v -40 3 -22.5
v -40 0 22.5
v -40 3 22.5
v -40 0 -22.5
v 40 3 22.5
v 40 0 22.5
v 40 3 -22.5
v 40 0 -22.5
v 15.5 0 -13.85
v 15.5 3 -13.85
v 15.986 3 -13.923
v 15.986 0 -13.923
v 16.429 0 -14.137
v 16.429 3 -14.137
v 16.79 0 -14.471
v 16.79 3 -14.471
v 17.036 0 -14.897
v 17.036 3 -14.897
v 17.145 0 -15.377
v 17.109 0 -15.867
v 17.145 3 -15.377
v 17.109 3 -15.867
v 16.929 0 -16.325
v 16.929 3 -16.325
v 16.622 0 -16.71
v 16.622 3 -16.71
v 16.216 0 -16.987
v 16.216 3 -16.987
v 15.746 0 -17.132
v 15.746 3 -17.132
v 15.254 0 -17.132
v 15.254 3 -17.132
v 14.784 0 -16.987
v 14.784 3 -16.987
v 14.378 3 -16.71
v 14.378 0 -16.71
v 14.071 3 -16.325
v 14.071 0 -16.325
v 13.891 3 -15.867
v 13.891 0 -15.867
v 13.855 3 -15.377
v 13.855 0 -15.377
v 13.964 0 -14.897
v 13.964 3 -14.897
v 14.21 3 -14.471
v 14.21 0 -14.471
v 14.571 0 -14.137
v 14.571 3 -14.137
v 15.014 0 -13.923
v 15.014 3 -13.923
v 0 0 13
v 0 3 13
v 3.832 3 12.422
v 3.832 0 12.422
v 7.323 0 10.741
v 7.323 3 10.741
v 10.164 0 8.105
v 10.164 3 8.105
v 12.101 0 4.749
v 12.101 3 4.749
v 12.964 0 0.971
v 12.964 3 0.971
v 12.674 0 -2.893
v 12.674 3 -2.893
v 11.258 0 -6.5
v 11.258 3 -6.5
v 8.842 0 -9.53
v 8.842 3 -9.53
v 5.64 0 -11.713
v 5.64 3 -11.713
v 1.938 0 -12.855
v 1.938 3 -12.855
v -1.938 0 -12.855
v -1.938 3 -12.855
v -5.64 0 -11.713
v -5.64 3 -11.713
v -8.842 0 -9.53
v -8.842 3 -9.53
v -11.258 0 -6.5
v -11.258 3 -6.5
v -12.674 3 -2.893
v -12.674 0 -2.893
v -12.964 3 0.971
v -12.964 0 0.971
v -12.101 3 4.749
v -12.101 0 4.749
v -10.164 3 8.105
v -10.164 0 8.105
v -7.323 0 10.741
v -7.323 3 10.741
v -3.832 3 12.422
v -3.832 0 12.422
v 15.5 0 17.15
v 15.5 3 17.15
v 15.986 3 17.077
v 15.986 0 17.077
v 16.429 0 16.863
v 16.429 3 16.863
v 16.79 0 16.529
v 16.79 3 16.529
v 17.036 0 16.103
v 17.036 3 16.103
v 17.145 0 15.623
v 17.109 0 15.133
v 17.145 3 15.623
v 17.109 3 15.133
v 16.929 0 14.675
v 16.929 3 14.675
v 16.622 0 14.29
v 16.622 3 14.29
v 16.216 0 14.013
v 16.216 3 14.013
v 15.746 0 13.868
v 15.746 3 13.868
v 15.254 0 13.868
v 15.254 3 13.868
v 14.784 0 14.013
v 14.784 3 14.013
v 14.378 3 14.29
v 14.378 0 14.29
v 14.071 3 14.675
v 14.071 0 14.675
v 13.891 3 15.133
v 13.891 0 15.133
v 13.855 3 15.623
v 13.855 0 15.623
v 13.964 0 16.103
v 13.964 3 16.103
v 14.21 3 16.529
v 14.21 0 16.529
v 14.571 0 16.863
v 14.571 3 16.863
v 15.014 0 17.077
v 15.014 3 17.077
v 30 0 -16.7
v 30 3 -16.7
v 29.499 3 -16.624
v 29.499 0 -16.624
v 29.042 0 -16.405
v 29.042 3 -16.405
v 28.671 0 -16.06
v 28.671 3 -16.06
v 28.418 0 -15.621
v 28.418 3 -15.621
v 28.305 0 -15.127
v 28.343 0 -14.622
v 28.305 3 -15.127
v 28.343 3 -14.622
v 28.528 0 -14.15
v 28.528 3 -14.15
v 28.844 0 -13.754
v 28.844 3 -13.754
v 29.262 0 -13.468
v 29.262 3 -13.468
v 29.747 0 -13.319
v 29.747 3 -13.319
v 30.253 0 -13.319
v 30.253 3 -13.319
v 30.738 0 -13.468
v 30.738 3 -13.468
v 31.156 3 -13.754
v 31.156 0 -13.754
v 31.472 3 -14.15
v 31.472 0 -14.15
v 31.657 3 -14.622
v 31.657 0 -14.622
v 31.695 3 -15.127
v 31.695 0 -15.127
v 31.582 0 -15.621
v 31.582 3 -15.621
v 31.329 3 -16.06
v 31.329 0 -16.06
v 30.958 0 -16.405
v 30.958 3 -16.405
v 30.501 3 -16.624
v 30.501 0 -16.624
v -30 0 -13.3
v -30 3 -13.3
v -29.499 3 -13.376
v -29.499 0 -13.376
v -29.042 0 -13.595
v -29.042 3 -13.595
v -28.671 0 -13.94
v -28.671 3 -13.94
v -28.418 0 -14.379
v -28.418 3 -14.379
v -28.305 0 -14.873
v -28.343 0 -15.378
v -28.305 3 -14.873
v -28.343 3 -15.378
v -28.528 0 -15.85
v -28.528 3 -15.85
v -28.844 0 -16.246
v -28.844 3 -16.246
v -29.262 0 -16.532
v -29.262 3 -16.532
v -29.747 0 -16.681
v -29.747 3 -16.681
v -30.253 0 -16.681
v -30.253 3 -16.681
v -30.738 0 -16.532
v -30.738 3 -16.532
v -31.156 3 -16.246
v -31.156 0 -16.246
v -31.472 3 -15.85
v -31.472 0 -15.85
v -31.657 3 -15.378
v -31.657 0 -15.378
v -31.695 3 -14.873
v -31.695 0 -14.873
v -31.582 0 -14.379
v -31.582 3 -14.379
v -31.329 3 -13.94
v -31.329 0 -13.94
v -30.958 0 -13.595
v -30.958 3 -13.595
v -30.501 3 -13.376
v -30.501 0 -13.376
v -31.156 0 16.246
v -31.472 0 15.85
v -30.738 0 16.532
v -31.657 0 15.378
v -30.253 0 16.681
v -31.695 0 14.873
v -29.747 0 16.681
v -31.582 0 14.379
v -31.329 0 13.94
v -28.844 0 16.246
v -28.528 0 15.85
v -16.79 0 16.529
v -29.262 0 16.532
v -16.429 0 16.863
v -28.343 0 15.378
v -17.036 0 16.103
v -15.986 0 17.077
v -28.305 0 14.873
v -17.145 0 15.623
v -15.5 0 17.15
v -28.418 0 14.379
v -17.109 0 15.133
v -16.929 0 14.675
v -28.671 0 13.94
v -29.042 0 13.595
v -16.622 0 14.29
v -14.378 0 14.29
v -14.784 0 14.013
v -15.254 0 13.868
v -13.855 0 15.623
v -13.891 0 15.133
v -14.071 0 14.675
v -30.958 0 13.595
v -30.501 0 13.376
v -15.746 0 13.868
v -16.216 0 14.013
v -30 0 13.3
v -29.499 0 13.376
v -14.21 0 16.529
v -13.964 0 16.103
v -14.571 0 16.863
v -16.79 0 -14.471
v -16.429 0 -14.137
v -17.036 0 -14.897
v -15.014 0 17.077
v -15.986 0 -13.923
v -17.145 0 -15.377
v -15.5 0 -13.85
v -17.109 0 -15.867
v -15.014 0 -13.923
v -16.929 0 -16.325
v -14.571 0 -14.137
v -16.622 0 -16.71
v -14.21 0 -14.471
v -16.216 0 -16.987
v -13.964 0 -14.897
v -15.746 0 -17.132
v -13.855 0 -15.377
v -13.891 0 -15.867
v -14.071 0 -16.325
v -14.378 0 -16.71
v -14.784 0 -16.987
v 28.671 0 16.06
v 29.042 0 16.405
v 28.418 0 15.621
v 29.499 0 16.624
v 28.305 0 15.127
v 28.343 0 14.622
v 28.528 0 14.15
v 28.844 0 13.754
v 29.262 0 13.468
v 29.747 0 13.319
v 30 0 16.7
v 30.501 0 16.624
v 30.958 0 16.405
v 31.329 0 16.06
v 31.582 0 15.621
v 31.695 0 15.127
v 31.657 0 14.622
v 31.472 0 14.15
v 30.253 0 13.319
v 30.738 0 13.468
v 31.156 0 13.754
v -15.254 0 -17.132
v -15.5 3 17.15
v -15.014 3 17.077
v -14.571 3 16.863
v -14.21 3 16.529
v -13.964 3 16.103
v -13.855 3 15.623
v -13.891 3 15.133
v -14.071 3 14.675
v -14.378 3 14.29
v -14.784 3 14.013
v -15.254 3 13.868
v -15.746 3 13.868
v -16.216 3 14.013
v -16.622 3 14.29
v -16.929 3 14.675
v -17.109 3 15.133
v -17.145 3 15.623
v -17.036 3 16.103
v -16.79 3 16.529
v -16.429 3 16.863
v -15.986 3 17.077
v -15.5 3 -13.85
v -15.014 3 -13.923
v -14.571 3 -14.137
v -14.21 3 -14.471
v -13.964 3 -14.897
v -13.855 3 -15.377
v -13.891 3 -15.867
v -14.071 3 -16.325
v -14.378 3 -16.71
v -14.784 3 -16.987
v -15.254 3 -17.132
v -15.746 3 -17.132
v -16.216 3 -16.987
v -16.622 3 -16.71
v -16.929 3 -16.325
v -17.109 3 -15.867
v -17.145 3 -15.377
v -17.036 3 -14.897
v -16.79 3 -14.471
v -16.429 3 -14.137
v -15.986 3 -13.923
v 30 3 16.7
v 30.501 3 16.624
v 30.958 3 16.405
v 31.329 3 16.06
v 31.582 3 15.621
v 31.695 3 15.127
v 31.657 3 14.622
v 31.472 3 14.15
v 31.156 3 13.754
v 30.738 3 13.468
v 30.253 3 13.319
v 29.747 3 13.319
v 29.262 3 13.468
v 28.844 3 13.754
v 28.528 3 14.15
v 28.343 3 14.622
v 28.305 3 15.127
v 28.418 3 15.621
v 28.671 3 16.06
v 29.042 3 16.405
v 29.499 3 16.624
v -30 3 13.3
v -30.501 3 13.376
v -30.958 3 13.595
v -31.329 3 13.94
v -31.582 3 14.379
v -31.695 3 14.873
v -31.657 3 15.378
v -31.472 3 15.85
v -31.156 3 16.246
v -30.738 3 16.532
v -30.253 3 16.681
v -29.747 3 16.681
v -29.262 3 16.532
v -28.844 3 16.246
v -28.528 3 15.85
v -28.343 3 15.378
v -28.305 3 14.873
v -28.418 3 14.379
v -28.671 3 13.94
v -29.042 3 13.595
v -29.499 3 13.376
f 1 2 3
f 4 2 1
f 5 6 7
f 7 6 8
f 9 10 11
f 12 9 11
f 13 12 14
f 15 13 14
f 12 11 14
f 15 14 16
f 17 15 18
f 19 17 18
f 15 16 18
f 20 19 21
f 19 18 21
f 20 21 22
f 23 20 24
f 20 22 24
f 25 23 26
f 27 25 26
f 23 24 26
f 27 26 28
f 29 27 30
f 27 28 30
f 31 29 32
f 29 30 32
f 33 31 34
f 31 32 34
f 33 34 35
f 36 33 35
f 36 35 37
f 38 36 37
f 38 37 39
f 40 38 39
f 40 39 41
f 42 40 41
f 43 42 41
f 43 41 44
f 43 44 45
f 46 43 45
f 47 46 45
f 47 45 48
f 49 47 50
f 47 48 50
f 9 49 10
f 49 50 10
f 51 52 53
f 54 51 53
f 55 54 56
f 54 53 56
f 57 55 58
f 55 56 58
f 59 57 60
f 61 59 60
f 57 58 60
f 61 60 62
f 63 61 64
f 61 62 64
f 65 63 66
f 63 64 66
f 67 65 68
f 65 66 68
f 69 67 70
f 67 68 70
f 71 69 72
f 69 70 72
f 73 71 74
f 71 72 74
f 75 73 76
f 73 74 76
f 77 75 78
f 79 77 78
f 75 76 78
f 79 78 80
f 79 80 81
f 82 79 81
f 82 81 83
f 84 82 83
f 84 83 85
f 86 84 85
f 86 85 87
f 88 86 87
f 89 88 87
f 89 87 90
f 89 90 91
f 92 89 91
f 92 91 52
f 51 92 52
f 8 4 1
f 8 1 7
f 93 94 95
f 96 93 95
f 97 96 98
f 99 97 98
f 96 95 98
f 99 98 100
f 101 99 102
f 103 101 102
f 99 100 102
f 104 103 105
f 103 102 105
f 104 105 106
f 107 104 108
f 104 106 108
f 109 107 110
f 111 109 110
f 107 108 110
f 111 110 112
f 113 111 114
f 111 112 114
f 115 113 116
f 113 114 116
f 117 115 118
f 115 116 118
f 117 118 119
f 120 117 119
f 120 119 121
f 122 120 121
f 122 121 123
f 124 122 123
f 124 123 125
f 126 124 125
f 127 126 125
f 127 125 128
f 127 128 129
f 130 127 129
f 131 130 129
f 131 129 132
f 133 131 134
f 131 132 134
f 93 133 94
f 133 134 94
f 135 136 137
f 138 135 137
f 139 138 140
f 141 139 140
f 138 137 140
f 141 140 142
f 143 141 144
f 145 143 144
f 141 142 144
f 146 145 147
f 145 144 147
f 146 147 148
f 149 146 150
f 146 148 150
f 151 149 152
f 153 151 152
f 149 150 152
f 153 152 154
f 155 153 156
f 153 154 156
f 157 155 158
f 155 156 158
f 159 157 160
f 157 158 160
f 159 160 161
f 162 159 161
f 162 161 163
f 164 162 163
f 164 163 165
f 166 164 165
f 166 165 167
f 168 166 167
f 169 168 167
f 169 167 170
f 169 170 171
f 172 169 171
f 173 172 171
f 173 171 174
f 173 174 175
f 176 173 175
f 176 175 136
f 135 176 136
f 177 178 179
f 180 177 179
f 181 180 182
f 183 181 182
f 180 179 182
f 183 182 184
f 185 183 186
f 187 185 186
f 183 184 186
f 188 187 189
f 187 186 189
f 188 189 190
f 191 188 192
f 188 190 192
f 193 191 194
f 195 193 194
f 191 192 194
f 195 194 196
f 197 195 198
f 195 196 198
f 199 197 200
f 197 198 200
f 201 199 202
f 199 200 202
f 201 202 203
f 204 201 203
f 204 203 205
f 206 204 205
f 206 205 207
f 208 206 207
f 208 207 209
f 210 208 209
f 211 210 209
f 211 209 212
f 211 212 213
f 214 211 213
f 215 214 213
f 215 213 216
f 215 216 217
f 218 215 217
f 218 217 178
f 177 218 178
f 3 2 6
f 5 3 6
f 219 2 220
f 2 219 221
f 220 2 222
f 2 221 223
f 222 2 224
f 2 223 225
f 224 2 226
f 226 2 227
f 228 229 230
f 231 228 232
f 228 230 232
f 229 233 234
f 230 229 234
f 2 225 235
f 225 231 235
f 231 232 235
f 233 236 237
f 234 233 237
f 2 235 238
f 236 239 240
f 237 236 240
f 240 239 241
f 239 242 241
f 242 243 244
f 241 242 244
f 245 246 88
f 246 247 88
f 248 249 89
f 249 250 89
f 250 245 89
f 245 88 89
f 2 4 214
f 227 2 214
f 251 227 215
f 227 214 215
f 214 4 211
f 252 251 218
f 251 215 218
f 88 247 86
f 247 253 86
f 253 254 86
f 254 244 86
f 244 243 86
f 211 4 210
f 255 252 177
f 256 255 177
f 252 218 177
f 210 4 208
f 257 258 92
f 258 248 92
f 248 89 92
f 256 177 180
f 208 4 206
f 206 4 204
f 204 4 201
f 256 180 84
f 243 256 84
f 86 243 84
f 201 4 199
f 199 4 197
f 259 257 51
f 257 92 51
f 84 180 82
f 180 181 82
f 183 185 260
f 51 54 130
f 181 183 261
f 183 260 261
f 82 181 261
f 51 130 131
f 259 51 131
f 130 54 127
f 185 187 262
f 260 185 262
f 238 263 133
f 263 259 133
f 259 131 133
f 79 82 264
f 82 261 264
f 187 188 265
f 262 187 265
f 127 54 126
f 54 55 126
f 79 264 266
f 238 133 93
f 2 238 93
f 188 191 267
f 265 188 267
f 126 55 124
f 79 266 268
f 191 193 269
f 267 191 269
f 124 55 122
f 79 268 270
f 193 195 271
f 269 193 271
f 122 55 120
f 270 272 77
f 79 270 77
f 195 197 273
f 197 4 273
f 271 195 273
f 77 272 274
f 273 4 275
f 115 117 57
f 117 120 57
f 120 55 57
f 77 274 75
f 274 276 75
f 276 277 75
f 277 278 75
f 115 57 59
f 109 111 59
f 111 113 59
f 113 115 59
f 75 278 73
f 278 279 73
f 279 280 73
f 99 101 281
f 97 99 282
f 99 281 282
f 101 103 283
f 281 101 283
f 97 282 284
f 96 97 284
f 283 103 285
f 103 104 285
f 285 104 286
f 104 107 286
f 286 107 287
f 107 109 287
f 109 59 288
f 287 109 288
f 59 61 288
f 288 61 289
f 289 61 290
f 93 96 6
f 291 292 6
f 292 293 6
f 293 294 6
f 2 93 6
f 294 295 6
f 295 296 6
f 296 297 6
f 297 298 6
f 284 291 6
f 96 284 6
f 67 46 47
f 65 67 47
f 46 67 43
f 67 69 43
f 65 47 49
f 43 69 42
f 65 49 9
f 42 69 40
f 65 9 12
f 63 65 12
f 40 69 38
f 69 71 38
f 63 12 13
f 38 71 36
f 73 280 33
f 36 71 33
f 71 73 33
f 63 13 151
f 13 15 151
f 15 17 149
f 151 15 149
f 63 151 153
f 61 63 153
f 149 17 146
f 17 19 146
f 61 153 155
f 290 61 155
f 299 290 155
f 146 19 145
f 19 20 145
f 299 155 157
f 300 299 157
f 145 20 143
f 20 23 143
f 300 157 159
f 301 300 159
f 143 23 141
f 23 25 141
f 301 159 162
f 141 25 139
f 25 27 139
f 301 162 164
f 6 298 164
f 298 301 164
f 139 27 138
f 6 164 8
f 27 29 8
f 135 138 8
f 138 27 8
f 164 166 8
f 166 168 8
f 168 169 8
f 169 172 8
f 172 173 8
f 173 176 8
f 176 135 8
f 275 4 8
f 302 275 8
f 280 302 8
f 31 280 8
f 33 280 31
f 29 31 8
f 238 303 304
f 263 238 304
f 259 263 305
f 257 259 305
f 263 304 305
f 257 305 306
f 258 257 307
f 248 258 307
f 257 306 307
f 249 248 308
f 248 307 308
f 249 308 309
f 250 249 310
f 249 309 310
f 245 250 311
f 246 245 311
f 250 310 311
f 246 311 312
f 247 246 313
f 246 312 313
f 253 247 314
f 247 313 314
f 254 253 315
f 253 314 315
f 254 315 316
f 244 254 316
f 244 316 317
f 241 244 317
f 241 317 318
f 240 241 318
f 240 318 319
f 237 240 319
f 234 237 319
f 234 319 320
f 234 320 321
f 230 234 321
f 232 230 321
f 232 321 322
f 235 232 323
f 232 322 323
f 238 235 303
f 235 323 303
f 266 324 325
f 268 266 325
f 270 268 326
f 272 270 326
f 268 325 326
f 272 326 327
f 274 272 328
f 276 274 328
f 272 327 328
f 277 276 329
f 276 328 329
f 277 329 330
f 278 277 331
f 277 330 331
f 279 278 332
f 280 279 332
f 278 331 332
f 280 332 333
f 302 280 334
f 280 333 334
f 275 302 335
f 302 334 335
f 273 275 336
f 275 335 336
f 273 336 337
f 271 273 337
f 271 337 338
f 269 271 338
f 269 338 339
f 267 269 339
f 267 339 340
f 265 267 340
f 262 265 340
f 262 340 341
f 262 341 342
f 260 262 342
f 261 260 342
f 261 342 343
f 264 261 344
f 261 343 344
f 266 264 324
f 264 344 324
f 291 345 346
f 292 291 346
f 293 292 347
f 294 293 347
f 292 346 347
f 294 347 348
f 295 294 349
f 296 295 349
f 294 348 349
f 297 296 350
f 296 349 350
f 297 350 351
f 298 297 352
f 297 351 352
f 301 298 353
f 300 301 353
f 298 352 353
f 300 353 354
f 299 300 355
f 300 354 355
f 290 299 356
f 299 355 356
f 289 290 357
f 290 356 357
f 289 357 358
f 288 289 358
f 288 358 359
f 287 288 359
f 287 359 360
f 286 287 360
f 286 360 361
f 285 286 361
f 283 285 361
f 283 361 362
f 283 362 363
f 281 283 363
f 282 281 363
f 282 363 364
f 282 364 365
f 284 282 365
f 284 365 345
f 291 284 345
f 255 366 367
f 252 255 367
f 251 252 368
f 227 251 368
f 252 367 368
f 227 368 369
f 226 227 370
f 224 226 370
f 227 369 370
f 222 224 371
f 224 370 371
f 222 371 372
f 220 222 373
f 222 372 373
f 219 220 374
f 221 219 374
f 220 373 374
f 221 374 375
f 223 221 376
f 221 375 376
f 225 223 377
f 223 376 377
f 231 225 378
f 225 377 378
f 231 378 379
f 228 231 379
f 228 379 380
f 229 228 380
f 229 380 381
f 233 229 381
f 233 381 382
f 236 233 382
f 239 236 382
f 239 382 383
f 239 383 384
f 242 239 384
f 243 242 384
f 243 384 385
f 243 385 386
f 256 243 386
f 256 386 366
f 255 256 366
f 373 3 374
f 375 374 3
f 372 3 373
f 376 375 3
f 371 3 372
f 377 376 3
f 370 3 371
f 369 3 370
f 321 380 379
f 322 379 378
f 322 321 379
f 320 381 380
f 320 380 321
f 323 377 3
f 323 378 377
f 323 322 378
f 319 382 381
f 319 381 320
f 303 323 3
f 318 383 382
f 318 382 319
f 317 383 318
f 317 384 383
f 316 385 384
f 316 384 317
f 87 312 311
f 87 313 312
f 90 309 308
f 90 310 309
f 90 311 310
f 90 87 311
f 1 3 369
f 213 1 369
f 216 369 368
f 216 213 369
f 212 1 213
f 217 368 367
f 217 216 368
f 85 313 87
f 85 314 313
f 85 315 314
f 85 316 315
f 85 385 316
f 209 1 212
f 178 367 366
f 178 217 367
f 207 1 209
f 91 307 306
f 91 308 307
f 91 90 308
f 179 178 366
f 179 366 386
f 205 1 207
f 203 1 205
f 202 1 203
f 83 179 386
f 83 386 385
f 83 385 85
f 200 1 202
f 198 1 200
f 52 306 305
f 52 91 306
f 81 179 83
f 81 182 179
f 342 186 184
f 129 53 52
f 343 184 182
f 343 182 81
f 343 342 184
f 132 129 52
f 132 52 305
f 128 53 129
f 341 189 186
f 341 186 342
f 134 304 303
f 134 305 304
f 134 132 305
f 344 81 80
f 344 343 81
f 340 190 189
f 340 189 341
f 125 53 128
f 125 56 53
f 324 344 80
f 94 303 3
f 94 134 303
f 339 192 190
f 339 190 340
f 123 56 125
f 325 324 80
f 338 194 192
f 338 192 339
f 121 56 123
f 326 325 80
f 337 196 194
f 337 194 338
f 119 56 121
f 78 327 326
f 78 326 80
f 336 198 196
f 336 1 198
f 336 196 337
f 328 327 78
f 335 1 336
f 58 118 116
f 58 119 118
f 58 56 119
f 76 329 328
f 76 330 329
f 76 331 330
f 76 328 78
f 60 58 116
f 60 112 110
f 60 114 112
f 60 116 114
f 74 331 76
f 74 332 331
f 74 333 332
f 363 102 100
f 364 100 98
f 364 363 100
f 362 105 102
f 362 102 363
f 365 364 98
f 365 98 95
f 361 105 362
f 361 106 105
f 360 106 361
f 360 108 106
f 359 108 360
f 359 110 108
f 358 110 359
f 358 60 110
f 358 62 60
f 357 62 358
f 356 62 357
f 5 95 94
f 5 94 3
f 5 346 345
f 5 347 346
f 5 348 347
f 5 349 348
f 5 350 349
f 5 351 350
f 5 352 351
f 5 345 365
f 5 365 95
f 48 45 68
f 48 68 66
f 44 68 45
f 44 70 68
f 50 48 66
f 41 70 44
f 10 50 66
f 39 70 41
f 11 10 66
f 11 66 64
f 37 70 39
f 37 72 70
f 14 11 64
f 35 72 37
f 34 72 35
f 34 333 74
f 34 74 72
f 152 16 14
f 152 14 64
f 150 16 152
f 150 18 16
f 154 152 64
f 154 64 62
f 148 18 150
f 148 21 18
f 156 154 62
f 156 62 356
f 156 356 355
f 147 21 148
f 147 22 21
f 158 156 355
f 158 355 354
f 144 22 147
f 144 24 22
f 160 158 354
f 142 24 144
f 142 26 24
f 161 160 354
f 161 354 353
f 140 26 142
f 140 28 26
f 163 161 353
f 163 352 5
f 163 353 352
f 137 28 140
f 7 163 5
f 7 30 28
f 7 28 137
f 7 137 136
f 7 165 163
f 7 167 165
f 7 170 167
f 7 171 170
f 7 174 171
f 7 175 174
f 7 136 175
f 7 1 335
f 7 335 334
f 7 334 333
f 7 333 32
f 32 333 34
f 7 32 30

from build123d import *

# Parameters (mm, degrees)
SKETCH_1_W          = 80
SKETCH_1_H          = 45
EXTRUDE_1_DEPTH     = 3
SKETCH_2_R          = 1.65
CUT_EXTRUDE_1_DEPTH = 3
SKETCH_3_R          = 13
CUT_EXTRUDE_2_DEPTH = 10
SKETCH_5_R          = 1.7
CUT_EXTRUDE_4_DEPTH = 10


with BuildPart() as part:
    # 草图1 → 凸台-拉伸1 (new body)
    with BuildSketch(Plane(origin=(0, 0, 0), x_dir=(1, 0, 0), z_dir=(0, 1, 0))):
        Rectangle(SKETCH_1_W, SKETCH_1_H)
    extrude(amount=EXTRUDE_1_DEPTH)

    # 草图2 → 切除-拉伸1 (cut)
    with BuildSketch(Plane(origin=(0, 3, 0), x_dir=(1, 0, 0), z_dir=(0, 1, 0))):
        with Locations(Location((-15.5, 15.5, 0), (0, 0, 270))):
            Circle(SKETCH_2_R)
        with Locations(Location((15.5, 15.5, 0), (0, 0, 270))):
            Circle(SKETCH_2_R)
        with Locations(Location((-15.5, -15.5, 0), (0, 0, 270))):
            Circle(SKETCH_2_R)
        with Locations(Location((15.5, -15.5, 0), (0, 0, 270))):
            Circle(SKETCH_2_R)
    extrude(amount=-CUT_EXTRUDE_1_DEPTH, mode=Mode.SUBTRACT)

    # 草图3 → 切除-拉伸2 (cut)
    with BuildSketch(Plane(origin=(0, 3, 0), x_dir=(1, 0, 0), z_dir=(0, 1, 0))):
        with Locations(Location((0, 0, 0), (0, 0, 270))):
            Circle(SKETCH_3_R)
    extrude(amount=-CUT_EXTRUDE_2_DEPTH, mode=Mode.SUBTRACT)

    # 草图5 → 切除-拉伸4 (cut)
    with BuildSketch(Plane(origin=(0, 3, 0), x_dir=(1, 0, 0), z_dir=(0, 1, 0))):
        with Locations(Location((-30, 15, 0), (0, 0, 270))):
            Circle(SKETCH_5_R)
        with Locations(Location((30, 15, 0), (0, 0, 90))):
            Circle(SKETCH_5_R)
        with Locations(Location((-30, -15, 0), (0, 0, 90))):
            Circle(SKETCH_5_R)
        with Locations(Location((30, -15, 0), (0, 0, 270))):
            Circle(SKETCH_5_R)
    extrude(amount=-CUT_EXTRUDE_4_DEPTH, mode=Mode.SUBTRACT)


solid = part.part
